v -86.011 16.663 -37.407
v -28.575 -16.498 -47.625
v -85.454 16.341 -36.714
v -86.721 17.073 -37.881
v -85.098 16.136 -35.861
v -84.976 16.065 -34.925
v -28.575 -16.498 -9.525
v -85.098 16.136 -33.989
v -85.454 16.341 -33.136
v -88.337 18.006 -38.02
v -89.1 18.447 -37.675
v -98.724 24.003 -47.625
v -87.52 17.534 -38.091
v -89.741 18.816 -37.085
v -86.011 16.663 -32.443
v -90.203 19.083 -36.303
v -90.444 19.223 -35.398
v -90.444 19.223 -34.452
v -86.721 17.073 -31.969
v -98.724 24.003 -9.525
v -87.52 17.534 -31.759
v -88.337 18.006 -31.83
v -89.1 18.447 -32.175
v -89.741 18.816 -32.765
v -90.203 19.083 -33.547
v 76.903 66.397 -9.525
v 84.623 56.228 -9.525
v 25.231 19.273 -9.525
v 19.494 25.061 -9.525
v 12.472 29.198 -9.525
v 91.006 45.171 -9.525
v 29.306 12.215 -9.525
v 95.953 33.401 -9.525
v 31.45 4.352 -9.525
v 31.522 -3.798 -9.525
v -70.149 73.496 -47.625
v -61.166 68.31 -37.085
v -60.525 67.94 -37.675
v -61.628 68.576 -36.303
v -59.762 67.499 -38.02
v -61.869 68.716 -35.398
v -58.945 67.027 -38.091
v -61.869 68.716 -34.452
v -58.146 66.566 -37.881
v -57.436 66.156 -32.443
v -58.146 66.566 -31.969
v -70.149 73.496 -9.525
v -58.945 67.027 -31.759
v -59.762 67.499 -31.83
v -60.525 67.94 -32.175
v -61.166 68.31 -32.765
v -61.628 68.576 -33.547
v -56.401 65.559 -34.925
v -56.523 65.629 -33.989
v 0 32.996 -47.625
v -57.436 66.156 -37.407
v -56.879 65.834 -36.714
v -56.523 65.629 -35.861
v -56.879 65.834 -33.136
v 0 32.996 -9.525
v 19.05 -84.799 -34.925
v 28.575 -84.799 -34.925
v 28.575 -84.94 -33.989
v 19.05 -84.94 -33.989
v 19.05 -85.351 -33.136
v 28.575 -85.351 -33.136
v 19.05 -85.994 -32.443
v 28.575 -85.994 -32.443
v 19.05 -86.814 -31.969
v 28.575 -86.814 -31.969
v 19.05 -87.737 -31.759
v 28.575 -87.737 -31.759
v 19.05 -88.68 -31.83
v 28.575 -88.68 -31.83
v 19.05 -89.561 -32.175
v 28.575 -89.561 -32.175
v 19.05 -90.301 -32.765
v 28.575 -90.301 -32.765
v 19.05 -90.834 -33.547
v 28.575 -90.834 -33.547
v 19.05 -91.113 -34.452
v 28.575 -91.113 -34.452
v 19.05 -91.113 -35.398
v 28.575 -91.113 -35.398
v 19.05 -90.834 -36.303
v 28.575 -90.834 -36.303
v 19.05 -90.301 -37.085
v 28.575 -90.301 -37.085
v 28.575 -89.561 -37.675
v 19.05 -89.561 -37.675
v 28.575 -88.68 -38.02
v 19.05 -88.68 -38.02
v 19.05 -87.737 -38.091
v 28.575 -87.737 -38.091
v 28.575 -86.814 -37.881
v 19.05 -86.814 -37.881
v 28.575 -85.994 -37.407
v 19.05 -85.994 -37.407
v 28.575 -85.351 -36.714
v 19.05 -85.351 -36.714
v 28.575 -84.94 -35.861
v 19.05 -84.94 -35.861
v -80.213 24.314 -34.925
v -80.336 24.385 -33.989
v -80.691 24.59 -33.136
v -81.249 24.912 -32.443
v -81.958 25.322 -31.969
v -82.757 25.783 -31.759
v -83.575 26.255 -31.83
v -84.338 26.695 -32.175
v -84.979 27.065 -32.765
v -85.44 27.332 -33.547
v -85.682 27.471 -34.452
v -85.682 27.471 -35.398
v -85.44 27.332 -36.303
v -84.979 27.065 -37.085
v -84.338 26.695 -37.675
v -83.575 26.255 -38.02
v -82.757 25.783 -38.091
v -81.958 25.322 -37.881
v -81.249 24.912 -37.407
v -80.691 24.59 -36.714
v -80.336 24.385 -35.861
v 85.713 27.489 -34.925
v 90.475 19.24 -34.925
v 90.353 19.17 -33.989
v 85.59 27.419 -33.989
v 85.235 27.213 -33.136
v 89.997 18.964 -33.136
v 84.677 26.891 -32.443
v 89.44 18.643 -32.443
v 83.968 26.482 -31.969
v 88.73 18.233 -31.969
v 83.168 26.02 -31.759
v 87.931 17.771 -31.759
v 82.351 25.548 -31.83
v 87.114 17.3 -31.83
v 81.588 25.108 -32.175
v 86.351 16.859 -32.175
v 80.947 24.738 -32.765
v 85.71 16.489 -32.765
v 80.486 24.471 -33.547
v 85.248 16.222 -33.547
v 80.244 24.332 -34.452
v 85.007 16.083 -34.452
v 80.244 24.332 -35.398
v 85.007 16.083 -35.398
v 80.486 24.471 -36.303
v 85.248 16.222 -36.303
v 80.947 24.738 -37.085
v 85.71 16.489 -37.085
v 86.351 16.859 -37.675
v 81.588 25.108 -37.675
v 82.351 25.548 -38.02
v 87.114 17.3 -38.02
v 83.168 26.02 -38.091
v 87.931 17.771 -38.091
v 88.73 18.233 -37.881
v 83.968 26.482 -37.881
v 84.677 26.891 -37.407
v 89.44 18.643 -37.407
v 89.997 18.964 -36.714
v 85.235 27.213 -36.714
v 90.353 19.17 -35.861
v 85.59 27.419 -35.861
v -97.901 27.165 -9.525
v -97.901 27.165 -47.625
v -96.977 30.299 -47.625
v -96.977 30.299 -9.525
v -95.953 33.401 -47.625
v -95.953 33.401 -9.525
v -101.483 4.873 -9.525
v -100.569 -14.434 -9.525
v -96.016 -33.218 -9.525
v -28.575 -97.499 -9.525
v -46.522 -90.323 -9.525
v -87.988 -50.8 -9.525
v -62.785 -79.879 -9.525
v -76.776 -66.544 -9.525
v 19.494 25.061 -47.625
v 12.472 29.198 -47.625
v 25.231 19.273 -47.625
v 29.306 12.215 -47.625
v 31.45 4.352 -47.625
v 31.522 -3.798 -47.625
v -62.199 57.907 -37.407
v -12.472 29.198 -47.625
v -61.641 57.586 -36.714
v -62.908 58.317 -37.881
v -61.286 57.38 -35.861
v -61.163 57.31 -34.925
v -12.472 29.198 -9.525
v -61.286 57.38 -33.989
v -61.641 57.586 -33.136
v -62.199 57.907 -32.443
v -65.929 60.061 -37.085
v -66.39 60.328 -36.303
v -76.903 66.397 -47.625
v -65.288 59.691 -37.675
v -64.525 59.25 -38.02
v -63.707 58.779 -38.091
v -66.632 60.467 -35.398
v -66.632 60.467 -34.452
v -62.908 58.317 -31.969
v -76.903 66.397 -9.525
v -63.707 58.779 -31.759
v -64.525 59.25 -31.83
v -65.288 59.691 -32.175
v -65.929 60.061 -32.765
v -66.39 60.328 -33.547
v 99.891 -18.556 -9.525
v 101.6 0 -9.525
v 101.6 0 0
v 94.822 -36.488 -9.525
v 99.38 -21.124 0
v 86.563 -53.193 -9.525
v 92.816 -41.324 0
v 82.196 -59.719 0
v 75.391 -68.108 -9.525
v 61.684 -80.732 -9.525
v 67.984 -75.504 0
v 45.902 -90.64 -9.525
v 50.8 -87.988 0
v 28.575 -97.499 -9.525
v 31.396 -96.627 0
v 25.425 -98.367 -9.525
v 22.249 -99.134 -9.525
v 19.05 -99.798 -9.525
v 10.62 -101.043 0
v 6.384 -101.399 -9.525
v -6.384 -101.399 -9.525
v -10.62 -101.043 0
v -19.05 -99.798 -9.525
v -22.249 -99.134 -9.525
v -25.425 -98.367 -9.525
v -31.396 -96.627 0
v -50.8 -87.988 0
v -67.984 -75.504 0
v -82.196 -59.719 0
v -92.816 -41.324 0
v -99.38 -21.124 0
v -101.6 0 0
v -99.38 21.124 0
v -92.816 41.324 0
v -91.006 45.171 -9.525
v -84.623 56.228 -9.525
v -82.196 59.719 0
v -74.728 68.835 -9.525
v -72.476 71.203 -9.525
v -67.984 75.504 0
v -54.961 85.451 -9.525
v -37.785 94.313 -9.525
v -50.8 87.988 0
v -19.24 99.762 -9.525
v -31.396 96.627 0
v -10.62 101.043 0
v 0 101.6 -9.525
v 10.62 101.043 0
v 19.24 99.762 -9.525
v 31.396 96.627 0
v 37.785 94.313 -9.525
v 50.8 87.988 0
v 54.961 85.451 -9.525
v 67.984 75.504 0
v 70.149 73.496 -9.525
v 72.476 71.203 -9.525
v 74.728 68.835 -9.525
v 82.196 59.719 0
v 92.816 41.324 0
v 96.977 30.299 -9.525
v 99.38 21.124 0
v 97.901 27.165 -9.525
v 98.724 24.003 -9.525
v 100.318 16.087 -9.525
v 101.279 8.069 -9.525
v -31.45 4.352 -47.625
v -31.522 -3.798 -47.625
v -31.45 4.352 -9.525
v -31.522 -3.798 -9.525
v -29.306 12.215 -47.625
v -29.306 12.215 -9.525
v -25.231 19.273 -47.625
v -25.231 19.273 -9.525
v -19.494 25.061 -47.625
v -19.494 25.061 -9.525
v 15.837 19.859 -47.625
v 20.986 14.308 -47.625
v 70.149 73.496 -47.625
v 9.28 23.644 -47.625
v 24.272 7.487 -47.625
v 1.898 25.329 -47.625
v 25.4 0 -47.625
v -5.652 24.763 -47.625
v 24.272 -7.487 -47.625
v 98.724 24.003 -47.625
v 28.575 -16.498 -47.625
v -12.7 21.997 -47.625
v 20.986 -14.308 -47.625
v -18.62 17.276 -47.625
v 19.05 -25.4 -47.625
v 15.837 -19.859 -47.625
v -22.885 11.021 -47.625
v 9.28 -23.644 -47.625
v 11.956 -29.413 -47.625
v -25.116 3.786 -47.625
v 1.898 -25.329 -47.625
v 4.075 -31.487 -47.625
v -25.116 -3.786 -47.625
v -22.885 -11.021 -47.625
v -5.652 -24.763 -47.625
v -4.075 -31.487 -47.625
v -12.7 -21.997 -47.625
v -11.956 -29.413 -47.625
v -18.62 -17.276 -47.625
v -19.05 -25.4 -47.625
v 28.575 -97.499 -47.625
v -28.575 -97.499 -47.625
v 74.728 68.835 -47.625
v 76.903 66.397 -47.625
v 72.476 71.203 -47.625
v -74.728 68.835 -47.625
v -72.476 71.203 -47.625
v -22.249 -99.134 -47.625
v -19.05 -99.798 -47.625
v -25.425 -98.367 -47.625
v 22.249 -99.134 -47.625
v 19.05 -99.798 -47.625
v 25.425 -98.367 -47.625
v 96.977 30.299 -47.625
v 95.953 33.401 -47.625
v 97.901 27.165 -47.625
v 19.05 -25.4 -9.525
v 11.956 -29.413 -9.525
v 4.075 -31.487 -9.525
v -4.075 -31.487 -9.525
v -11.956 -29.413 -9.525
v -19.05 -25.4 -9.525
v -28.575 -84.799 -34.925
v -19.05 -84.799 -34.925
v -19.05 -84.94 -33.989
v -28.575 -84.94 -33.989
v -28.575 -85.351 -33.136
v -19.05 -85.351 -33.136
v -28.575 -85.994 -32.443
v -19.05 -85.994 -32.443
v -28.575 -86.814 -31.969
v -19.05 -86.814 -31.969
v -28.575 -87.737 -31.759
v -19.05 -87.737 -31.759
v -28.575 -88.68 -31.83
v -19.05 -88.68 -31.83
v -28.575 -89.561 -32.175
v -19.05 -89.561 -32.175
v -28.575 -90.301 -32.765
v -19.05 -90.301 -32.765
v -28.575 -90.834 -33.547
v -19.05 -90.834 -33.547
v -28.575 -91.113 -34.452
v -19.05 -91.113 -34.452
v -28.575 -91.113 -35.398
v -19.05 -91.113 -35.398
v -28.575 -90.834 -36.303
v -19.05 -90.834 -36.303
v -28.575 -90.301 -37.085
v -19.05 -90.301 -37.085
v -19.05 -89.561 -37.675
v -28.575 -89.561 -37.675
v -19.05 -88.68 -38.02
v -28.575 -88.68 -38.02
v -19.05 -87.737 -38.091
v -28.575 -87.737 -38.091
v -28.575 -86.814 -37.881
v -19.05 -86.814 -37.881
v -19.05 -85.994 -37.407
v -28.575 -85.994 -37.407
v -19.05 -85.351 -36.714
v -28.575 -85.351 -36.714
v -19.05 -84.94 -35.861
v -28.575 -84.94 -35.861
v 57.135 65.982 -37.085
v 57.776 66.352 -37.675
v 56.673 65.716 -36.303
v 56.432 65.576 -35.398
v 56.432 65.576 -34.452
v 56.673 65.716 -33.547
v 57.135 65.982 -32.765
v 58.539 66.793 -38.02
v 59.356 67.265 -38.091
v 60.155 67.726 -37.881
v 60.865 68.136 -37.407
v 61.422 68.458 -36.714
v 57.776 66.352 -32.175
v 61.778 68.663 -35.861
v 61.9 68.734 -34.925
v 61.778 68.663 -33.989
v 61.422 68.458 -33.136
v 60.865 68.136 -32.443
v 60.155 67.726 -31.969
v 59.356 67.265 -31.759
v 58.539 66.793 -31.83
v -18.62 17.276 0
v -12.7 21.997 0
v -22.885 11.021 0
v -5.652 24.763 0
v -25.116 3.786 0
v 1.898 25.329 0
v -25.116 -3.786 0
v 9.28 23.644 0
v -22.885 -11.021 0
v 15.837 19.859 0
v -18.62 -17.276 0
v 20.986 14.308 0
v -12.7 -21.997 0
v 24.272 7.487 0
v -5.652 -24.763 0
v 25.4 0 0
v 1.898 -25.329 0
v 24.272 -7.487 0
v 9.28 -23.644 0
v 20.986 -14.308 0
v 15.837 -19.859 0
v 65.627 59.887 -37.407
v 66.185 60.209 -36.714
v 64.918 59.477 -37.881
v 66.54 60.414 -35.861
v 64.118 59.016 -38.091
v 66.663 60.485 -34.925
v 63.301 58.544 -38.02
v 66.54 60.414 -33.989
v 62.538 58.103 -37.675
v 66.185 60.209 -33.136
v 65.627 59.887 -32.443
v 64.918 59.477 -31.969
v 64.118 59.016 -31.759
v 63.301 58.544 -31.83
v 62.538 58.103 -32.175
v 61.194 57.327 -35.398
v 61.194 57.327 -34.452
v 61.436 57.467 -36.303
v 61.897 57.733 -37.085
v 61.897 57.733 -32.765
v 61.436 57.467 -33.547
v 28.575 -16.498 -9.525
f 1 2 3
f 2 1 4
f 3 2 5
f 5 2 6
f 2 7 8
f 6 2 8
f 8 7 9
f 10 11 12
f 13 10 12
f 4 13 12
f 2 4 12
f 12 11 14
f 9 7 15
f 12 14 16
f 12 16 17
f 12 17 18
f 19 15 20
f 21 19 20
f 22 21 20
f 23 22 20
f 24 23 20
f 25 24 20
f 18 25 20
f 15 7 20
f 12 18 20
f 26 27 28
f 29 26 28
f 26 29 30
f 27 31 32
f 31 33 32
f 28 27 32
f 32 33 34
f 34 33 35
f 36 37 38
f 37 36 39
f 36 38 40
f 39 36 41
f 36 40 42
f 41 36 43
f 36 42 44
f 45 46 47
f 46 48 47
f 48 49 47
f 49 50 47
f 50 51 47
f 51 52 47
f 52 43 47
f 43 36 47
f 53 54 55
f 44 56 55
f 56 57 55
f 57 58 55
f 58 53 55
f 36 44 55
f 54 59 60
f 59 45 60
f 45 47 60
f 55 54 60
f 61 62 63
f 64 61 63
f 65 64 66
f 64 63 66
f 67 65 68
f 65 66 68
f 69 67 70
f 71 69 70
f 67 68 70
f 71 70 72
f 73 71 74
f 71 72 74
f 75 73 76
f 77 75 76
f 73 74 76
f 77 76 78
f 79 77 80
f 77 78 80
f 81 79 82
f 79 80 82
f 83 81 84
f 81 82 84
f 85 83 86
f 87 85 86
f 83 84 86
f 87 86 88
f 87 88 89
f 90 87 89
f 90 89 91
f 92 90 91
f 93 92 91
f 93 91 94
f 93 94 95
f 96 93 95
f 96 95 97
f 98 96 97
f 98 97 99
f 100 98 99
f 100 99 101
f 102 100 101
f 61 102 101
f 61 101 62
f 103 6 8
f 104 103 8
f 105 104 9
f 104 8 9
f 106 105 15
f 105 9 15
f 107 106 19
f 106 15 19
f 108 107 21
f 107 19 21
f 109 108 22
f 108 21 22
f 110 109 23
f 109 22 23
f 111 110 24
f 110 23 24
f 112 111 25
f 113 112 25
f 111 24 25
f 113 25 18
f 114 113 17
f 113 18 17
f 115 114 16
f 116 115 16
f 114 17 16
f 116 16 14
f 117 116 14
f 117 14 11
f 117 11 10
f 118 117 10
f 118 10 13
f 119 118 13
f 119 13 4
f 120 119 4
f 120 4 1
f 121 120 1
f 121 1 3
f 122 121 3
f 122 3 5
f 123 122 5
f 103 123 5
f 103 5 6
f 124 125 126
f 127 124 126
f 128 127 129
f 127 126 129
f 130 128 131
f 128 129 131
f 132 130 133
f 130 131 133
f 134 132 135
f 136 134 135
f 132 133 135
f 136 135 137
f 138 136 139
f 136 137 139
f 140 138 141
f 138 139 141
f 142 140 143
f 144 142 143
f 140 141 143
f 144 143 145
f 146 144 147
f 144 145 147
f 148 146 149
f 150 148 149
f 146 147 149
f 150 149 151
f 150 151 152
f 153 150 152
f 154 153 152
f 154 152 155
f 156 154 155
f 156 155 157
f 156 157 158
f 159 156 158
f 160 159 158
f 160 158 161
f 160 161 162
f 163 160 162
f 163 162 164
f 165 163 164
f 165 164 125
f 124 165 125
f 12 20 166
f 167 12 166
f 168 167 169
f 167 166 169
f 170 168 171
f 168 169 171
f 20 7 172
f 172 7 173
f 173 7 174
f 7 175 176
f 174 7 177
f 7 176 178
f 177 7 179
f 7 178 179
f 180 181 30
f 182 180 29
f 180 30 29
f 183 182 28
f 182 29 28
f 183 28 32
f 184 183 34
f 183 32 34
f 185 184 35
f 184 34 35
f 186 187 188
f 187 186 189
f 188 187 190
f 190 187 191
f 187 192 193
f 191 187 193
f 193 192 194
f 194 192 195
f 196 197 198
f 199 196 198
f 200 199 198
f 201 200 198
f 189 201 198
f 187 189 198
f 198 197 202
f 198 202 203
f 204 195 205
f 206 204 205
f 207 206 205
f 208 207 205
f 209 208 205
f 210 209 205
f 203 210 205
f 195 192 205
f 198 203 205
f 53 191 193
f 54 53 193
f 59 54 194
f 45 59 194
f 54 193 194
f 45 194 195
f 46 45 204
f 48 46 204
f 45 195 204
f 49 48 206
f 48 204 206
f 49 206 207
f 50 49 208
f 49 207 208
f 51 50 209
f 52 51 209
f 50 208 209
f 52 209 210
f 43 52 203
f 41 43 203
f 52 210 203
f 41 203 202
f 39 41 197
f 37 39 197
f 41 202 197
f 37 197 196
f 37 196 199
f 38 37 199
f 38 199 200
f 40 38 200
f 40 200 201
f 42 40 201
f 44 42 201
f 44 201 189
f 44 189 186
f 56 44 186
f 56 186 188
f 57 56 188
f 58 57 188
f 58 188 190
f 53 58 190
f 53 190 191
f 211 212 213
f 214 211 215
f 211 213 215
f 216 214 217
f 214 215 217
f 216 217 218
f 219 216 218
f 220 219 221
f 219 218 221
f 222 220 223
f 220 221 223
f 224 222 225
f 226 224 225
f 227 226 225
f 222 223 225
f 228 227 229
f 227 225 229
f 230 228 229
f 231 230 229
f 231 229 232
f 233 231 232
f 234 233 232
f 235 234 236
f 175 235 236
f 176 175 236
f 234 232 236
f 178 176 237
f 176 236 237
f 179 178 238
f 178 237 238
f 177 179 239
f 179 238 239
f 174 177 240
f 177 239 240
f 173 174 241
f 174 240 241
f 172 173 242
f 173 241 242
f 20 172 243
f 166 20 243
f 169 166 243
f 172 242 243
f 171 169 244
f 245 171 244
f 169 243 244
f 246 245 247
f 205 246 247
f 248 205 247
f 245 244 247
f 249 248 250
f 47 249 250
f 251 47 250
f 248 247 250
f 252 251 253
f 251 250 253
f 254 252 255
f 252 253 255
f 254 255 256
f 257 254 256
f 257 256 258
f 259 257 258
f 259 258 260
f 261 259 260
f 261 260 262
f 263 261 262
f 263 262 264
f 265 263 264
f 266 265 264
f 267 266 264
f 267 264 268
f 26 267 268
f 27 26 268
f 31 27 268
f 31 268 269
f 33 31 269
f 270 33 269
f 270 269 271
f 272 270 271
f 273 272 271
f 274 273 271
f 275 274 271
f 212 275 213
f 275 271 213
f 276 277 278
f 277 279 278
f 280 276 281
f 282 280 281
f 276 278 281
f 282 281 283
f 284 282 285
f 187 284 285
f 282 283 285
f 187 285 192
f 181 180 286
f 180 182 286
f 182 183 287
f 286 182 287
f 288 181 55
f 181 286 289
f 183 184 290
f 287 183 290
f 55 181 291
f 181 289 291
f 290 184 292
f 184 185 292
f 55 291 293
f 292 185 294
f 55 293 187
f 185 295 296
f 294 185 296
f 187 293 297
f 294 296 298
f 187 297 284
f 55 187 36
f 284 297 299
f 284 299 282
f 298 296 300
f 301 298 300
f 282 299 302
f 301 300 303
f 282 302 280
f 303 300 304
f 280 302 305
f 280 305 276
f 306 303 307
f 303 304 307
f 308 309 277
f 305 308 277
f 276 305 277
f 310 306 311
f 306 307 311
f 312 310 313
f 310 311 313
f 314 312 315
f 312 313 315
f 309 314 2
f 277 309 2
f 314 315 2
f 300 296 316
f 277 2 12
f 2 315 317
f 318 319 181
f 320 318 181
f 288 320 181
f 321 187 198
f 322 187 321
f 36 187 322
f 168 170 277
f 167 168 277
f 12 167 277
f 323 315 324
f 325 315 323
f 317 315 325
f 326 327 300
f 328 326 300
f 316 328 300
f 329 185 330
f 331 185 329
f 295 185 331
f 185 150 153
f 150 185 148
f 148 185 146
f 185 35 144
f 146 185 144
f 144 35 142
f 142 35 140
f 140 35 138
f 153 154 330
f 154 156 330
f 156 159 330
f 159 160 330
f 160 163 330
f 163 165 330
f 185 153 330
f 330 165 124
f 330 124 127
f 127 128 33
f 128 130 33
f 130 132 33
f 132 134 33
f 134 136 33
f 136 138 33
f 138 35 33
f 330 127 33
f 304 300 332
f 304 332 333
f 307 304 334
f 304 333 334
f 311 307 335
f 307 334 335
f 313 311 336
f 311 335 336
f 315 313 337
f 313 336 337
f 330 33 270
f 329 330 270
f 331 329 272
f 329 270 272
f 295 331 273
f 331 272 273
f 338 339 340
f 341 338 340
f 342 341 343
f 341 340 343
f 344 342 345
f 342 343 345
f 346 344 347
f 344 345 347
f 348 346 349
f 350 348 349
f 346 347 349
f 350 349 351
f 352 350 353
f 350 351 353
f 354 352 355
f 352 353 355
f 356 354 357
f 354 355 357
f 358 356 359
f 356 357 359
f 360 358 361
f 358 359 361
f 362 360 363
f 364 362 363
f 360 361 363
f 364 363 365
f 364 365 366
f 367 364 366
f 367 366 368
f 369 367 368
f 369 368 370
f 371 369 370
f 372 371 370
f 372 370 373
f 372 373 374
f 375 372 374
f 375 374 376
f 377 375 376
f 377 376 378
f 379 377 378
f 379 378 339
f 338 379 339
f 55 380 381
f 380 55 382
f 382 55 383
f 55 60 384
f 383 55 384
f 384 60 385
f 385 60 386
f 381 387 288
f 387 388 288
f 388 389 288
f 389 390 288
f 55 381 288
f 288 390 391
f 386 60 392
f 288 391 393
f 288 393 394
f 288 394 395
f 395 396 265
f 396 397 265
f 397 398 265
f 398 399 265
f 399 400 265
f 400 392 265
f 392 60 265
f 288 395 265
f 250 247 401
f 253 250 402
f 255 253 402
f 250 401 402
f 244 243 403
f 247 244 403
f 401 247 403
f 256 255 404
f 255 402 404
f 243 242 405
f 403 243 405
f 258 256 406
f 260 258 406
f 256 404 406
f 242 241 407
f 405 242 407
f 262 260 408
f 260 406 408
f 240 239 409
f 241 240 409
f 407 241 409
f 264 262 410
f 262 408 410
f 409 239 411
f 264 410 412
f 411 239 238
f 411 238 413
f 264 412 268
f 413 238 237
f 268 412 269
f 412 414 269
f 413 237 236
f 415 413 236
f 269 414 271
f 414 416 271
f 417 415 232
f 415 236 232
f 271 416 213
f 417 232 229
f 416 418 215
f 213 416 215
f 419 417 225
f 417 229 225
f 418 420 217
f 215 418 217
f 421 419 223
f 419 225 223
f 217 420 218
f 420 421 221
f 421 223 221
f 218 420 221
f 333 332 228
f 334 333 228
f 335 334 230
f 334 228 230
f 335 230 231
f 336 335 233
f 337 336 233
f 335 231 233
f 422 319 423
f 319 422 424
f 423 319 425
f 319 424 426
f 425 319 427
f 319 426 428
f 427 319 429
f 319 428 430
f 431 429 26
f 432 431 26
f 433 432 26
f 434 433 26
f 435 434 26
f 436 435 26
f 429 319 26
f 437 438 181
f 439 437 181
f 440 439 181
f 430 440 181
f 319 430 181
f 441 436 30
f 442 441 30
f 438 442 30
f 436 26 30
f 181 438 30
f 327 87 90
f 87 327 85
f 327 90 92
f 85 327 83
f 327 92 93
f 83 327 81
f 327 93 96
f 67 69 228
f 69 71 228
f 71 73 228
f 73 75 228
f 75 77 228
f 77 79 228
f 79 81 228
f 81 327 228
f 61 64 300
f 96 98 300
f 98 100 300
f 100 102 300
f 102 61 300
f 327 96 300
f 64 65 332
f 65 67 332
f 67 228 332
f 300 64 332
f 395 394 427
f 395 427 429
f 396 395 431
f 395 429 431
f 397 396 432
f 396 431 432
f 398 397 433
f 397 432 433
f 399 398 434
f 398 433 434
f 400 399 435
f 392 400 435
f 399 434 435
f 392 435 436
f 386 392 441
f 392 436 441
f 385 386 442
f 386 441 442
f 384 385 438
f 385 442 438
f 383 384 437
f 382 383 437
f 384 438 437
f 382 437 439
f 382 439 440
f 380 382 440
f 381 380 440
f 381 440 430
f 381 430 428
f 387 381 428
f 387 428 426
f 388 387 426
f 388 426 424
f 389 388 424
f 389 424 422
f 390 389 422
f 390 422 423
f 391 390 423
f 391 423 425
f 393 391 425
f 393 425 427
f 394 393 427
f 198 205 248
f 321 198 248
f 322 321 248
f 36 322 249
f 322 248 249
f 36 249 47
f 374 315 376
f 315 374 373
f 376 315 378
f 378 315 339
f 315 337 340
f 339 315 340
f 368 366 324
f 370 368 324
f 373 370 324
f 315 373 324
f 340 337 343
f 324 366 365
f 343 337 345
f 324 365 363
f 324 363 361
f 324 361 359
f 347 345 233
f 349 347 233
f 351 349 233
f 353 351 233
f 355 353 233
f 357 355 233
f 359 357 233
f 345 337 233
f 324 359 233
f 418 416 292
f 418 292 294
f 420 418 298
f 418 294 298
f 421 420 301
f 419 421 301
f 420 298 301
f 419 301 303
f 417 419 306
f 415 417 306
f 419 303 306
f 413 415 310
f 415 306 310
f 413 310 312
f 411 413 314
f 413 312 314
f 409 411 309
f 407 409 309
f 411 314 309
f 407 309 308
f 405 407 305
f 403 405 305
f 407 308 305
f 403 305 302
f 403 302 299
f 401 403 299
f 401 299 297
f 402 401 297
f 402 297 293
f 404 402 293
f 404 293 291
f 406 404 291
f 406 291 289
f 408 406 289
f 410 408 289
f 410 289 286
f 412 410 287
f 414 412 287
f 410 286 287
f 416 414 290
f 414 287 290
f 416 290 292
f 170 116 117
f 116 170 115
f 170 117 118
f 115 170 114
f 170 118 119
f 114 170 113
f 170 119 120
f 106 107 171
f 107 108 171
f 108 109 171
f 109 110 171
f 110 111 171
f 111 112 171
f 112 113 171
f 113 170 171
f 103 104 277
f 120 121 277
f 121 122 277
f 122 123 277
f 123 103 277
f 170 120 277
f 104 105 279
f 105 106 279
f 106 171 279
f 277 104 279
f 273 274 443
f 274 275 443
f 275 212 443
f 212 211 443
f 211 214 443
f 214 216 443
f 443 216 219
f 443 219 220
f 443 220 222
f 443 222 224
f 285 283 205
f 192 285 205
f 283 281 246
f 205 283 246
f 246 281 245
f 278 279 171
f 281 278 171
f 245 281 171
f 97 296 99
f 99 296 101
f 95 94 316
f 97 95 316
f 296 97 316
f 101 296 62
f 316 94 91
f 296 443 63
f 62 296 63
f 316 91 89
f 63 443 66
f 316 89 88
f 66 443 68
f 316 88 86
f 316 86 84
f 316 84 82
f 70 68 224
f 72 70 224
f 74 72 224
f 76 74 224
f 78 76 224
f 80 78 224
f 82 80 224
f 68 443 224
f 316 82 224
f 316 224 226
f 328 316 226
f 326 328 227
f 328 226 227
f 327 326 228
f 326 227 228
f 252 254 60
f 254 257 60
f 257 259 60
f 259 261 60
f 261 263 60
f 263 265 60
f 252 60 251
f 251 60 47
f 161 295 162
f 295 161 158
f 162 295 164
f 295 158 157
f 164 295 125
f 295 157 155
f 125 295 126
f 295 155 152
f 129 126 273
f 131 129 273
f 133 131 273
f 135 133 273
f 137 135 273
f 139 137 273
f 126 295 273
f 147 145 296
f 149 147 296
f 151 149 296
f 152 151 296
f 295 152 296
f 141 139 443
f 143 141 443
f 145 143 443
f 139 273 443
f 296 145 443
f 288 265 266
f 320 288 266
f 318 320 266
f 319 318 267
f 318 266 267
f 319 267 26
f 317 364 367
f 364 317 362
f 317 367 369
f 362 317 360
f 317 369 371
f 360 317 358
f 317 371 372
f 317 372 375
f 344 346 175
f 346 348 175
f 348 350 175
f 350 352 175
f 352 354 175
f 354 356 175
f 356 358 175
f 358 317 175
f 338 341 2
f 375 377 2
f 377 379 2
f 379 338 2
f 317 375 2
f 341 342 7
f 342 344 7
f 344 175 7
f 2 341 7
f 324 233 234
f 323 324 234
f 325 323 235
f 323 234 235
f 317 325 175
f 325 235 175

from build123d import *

# Parameters (mm, degrees)
F3_DEPTH = 38.1
F4_R     = 3.175
F5_DEPTH = 76.2
F6_R     = 3.175
F7_DEPTH = 76.2
F8_R     = 3.175
F9_DEPTH = 76.2


with BuildPart() as f1:
    # F0 (on Front) → F1 (revolve)
    with BuildSketch(Plane.XZ):
        Polygon((101.6, 0), (25.4, 0), (25.4, -47.625), (31.75, -47.625), (31.75, -9.525), (101.6, -9.525), align=None)
    revolve(axis=Axis((0, 0, -4.0980735794), (0, 0, -1)))

    # F2 (on face) → F3 (join)
    with BuildSketch(Plane(origin=(0, 0, -9.525), x_dir=(1, 0, 0), z_dir=(0, 0, -1))):
        with BuildLine():
            Line((-28.575, 13.8395041457), (-28.575, 16.4977839421))
            Line((-28.575, 16.4977839421), (-98.7239970333, -24.0027583784))
            ThreePointArc((-98.7239970333, -24.0027583784), (-97.4517043144, -28.7354367675), (-95.952675689, -33.4012578824))
            Line((-95.952675689, -33.4012578824), (-31.5220452561, 3.7977839421))
            ThreePointArc((-31.5220452561, 3.7977839421), (-30.4651070619, 8.9409032938), (-28.575, 13.8395041457))
        make_face()
        with BuildLine():
            Line((-12.4720452561, -29.1977839421), (-76.902675689, -66.3968257666))
            ThreePointArc((-76.902675689, -66.3968257666), (-73.6114703867, -70.0279331946), (-70.1489970333, -73.4961102047))
            Line((-70.1489970333, -73.4961102047), (0, -32.9955678842))
            Line((0, -32.9955678842), (-2.302137834, -31.666427986))
            ThreePointArc((-2.302137834, -31.666427986), (-7.4895041457, -30.8540082915), (-12.4720452561, -29.1977839421))
        make_face()
        with BuildLine():
            ThreePointArc((2.302137834, -31.666427986), (0, -31.75), (-2.302137834, -31.666427986))
            Line((-2.302137834, -31.666427986), (0, -32.9955678842))
            Line((0, -32.9955678842), (2.302137834, -31.666427986))
        make_face()
        with BuildLine():
            ThreePointArc((70.1489970333, -73.4961102047), (73.6114703867, -70.0279331946), (76.902675689, -66.3968257666))
            Line((76.902675689, -66.3968257666), (12.4720452561, -29.1977839421))
            ThreePointArc((12.4720452561, -29.1977839421), (7.4895041457, -30.8540082915), (2.302137834, -31.666427986))
            Line((2.302137834, -31.666427986), (0, -32.9955678842))
            Line((0, -32.9955678842), (70.1489970333, -73.4961102047))
        make_face()
        with BuildLine():
            Line((98.7239970333, -24.0027583784), (28.575, 16.4977839421))
            Line((28.575, 16.4977839421), (28.575, 13.8395041457))
            ThreePointArc((28.575, 13.8395041457), (30.4651070619, 8.9409032938), (31.5220452561, 3.7977839421))
            Line((31.5220452561, 3.7977839421), (95.952675689, -33.4012578824))
            ThreePointArc((95.952675689, -33.4012578824), (97.4517043144, -28.7354367675), (98.7239970333, -24.0027583784))
        make_face()
        with BuildLine():
            ThreePointArc((-28.575, 13.8395041457), (-27.4963065702, 15.875), (-26.272862166, 17.8269238403))
            Line((-26.272862166, 17.8269238403), (-28.575, 16.4977839421))
            Line((-28.575, 16.4977839421), (-28.575, 13.8395041457))
        make_face()
        with BuildLine():
            Line((-19.05, 25.4), (-19.05, 99.7980836489))
            ThreePointArc((-19.05, 99.7980836489), (-23.8402339277, 98.7633699621), (-28.575, 97.4988685832))
            Line((-28.575, 97.4988685832), (-28.575, 16.4977839421))
            Line((-28.575, 16.4977839421), (-26.272862166, 17.8269238403))
            ThreePointArc((-26.272862166, 17.8269238403), (-22.9756029161, 21.9131049977), (-19.05, 25.4))
        make_face()
        with BuildLine():
            Line((28.575, 16.4977839421), (26.272862166, 17.8269238403))
            ThreePointArc((26.272862166, 17.8269238403), (27.4963065702, 15.875), (28.575, 13.8395041457))
            Line((28.575, 13.8395041457), (28.575, 16.4977839421))
        make_face()
        with BuildLine():
            ThreePointArc((28.575, 97.4988685832), (23.8402339277, 98.7633699621), (19.05, 99.7980836489))
            Line((19.05, 99.7980836489), (19.05, 25.4))
            ThreePointArc((19.05, 25.4), (22.9756029161, 21.9131049977), (26.272862166, 17.8269238403))
            Line((26.272862166, 17.8269238403), (28.575, 16.4977839421))
            Line((28.575, 16.4977839421), (28.575, 97.4988685832))
        make_face()
    extrude(amount=F3_DEPTH)

    # F4 (on face) → F5 (cut)
    with BuildSketch(Plane.YZ.offset(28.575)):
        with Locations((-87.9738685832, -34.925)):
            Circle(F4_R)
    extrude(amount=-F5_DEPTH, mode=Mode.SUBTRACT)

    # F6 (on face) → F7 (cut)
    with BuildSketch(Plane(origin=(14.2875, -24.7466759131, 0), x_dir=(0.8660254038, 0.5, 0), z_dir=(0.5, -0.8660254038, 0))):
        with Locations((84.7988685832, -34.925)):
            Circle(F6_R)
    extrude(amount=-F7_DEPTH, mode=Mode.SUBTRACT)

    # F8 (on face) → F9 (cut)
    with BuildSketch(Plane(origin=(-14.2875, -24.7466759131, 0), x_dir=(0.8660254038, -0.5, 0), z_dir=(-0.5, -0.8660254038, 0))):
        with Locations((-84.7988685832, -34.925)):
            Circle(F8_R)
    extrude(amount=-F9_DEPTH, mode=Mode.SUBTRACT)


solid = f1.part
